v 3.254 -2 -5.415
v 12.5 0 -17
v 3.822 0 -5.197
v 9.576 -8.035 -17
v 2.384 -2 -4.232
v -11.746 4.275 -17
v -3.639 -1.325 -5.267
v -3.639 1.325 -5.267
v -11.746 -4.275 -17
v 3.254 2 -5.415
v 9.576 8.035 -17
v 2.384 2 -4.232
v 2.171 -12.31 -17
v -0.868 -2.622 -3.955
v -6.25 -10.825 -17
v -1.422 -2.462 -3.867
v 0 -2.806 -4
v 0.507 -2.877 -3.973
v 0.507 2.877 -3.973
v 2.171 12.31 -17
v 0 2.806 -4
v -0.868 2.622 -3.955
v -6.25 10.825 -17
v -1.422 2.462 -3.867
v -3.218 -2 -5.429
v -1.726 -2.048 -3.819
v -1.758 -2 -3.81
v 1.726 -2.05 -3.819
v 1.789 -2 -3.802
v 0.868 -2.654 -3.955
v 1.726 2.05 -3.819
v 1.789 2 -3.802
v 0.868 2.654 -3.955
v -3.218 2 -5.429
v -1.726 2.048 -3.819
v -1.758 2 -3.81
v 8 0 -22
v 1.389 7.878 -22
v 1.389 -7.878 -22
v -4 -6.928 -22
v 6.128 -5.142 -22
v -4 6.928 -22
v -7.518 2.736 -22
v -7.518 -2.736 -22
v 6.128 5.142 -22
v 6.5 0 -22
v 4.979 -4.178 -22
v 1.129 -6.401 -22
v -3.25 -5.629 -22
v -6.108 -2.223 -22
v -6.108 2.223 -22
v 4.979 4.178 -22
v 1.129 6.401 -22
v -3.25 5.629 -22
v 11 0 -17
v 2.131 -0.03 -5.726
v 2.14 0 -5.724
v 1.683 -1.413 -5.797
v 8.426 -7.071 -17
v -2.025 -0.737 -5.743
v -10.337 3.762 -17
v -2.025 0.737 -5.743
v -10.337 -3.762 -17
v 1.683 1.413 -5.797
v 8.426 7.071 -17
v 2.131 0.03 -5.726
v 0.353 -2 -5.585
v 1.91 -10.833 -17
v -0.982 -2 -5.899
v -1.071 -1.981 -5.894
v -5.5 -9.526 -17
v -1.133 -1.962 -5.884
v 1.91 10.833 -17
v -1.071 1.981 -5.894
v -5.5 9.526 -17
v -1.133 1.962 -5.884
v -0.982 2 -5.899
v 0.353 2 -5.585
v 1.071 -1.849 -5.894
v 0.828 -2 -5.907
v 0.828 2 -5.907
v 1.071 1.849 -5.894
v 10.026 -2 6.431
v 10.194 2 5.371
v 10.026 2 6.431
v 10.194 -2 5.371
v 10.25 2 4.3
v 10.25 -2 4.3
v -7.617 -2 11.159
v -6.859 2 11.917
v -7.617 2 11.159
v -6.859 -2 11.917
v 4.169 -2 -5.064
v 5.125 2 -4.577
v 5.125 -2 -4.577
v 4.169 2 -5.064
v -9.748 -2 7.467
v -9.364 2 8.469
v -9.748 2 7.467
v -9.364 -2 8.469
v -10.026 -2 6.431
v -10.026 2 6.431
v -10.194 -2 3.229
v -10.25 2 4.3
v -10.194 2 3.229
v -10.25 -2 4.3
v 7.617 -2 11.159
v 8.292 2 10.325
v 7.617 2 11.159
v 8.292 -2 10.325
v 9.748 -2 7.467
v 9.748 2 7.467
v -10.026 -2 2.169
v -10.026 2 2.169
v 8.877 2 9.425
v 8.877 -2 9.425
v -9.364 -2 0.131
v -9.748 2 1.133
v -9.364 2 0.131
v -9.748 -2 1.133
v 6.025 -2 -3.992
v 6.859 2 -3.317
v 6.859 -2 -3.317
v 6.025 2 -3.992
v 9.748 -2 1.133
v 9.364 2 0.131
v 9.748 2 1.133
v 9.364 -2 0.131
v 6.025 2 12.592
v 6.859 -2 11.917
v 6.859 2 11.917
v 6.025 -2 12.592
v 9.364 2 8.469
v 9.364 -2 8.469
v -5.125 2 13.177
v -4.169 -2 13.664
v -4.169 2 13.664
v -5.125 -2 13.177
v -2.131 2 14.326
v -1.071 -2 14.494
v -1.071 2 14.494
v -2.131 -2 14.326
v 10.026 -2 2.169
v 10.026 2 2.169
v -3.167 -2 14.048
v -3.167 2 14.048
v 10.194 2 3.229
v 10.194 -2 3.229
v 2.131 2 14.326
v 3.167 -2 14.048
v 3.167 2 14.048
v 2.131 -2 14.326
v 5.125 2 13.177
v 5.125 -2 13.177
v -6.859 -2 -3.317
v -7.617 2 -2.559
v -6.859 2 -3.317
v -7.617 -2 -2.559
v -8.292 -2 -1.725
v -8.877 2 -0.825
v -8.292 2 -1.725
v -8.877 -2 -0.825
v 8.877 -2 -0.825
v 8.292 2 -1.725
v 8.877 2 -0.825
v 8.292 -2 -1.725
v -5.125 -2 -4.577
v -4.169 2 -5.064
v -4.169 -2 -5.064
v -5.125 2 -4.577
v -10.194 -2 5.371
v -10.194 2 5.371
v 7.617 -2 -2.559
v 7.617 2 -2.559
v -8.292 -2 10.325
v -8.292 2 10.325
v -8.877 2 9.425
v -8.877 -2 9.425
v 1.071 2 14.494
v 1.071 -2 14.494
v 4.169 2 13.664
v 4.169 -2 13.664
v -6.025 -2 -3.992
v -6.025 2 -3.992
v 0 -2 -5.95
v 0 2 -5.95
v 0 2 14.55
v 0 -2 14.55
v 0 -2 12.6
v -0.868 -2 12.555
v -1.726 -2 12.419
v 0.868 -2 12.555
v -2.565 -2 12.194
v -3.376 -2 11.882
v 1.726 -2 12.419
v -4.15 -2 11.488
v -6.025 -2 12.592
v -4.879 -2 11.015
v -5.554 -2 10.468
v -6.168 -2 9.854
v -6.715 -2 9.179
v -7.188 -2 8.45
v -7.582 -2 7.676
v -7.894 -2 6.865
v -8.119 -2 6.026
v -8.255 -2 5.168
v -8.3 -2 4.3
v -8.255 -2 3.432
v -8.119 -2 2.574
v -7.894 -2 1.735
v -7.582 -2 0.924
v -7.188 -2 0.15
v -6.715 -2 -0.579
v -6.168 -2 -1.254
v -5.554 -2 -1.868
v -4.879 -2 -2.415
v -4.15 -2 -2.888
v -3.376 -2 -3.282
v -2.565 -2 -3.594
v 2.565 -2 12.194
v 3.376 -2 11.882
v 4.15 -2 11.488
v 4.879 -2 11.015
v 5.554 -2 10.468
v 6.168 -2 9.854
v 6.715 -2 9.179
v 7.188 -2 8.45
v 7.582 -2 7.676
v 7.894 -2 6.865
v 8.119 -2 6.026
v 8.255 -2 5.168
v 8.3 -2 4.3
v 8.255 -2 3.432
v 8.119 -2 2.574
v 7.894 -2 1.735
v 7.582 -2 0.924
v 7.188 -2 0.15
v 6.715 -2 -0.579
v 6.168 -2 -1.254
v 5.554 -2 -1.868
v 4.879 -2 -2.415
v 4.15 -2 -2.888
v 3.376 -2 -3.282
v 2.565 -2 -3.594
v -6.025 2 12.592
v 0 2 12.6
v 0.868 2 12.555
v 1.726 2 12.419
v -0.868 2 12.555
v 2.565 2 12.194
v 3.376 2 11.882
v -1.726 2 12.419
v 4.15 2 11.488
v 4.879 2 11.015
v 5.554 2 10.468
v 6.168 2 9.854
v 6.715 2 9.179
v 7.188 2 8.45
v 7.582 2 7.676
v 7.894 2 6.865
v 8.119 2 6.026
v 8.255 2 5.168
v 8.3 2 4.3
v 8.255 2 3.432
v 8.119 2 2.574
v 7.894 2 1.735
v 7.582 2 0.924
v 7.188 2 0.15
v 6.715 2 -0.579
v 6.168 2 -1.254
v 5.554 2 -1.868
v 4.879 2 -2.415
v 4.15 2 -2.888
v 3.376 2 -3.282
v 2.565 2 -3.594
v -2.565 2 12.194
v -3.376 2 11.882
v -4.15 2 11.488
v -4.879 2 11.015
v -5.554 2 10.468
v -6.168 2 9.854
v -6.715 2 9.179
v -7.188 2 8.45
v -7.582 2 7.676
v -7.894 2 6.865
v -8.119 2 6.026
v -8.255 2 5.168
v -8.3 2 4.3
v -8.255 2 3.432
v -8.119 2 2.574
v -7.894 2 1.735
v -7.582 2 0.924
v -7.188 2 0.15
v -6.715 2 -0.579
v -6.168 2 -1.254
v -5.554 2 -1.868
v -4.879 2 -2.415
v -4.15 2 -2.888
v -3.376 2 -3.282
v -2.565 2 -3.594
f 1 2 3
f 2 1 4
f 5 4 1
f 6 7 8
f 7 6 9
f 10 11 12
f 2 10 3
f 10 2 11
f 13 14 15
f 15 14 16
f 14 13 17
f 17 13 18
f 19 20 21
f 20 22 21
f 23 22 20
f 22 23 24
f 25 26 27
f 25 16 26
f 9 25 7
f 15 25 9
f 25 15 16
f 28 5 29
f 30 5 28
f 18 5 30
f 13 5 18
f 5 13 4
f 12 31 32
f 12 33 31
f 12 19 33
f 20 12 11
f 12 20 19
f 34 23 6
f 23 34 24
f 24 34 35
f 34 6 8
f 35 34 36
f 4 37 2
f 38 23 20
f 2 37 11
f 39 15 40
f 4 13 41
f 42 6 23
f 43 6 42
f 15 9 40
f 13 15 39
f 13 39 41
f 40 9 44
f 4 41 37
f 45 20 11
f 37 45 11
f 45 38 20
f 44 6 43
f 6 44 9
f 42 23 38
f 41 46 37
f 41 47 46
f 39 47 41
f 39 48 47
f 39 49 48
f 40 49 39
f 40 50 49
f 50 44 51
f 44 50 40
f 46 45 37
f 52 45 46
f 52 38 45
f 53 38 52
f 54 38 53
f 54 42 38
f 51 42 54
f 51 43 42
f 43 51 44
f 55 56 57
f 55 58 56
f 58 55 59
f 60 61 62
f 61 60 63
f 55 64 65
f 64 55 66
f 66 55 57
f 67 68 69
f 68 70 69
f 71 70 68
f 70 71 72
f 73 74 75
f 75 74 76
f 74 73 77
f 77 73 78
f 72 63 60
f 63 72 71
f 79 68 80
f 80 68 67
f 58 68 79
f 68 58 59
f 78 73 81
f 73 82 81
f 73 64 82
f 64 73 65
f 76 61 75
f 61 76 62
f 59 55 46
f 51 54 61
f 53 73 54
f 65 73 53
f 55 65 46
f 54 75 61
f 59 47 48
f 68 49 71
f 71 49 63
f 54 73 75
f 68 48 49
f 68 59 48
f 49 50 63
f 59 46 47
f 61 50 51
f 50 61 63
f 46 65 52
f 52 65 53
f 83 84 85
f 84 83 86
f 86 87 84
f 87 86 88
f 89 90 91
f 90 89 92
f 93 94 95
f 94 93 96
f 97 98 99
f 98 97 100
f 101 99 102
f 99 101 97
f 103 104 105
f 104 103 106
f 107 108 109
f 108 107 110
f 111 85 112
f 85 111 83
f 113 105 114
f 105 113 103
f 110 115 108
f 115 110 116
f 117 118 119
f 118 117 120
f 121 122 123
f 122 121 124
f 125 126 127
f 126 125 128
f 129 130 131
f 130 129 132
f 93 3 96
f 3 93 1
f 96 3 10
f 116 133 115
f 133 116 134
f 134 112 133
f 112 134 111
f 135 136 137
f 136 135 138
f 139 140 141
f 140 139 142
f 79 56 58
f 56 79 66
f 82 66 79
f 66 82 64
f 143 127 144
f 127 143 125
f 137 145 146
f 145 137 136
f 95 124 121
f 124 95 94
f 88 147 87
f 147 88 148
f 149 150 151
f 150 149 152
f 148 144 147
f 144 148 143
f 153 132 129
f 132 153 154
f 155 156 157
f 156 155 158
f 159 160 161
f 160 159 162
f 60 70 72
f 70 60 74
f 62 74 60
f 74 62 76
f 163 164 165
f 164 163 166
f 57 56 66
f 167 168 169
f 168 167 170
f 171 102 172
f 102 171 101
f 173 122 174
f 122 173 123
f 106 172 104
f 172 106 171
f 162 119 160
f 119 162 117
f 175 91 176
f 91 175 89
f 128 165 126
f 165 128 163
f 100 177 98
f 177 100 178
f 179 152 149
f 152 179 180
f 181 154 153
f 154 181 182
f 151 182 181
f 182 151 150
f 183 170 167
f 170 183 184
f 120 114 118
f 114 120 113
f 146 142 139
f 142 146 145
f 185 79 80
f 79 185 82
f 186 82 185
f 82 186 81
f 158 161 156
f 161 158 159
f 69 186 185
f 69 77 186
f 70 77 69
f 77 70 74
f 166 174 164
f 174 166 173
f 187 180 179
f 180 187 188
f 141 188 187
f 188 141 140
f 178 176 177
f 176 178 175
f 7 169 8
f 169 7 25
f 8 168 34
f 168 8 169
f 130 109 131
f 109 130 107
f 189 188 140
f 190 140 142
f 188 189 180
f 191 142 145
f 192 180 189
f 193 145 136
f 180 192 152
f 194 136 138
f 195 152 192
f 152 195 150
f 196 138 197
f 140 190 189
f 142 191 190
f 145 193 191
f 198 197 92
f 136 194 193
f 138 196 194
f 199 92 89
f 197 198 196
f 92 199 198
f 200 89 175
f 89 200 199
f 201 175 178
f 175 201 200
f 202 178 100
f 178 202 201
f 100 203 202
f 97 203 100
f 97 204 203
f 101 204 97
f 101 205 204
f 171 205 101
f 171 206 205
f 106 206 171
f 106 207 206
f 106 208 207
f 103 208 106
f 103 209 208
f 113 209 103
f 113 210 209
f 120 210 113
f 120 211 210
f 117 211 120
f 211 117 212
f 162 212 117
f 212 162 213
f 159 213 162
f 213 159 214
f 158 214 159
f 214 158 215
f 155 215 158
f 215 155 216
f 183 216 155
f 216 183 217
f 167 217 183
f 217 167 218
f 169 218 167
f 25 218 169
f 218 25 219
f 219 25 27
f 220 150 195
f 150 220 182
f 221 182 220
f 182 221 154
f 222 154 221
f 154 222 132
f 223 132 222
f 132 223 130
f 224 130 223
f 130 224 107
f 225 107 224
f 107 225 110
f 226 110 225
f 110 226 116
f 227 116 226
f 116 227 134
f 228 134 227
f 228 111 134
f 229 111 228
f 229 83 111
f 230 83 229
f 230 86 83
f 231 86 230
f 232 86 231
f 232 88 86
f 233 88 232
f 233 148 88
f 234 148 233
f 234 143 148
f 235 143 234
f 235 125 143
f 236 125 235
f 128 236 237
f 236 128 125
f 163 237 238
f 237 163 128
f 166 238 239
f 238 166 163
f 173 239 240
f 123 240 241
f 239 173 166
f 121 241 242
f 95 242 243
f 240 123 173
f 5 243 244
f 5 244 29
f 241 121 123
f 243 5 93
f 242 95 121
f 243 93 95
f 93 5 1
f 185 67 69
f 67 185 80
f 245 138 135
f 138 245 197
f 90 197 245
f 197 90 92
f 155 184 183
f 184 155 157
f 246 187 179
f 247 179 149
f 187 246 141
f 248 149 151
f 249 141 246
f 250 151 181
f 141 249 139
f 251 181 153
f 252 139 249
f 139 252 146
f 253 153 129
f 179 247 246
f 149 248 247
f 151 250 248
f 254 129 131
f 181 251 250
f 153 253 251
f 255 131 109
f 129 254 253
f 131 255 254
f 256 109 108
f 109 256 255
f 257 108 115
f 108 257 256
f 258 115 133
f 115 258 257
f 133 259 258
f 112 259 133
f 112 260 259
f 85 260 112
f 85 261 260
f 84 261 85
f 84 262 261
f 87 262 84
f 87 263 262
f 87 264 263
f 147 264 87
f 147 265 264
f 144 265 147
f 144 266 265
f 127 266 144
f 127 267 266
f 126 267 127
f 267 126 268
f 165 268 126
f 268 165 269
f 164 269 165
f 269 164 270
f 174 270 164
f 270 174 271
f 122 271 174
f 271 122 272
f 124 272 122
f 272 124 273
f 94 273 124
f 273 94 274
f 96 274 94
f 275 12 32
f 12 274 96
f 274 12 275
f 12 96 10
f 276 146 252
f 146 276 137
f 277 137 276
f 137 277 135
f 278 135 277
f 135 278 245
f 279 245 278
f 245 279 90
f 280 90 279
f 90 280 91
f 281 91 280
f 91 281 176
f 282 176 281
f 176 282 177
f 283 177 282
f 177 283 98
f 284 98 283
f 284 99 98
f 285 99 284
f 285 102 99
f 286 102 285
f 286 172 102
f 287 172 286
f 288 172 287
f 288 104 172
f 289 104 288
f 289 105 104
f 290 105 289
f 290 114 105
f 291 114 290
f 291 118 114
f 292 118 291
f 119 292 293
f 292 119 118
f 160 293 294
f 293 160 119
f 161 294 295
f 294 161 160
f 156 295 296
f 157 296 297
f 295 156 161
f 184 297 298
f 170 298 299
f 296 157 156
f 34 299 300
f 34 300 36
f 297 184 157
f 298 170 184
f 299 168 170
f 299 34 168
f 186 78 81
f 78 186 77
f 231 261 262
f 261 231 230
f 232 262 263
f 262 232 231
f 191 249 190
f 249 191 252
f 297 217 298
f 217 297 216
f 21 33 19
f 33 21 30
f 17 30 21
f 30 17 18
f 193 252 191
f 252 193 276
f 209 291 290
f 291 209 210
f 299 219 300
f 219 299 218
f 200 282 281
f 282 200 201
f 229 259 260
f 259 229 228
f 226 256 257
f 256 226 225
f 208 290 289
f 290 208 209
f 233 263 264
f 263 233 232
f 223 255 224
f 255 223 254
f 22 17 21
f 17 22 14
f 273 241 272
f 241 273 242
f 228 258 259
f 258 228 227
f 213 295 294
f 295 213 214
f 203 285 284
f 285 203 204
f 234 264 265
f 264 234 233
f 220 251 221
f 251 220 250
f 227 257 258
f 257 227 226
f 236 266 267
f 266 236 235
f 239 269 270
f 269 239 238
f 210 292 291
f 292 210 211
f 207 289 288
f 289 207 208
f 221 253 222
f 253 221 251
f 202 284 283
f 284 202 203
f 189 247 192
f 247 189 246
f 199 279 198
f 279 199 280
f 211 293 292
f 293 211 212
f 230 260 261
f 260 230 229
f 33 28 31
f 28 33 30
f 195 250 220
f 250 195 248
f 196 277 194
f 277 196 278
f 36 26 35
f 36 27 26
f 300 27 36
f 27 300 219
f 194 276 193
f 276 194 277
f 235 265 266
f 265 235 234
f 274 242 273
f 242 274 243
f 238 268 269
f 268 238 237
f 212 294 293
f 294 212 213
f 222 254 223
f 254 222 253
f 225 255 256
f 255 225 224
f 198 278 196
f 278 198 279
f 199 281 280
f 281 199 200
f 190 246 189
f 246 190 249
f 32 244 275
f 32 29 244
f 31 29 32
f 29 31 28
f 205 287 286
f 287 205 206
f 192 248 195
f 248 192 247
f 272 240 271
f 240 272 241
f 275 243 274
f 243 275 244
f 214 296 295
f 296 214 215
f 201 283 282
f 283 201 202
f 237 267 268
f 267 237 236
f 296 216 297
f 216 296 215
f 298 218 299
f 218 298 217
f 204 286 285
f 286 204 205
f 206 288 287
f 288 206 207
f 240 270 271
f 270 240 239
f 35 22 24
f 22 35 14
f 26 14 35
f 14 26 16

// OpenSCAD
// Internal diameter of ring (in mm).
internal_diameter = 16.6;
$fn=60 * 1;


module diamond(w, w2, h1, h2) {
    $fn=9;
    cylinder(d1=0, d2=w, h=h1);
    translate([0, 0, h1]) cylinder(d1=w, d2=w2, h=h2);
}

module dvase(w, w2, h1, h2) {
    difference() {
            diamond(w, w2, h1, h2);
            translate([0, 0, 3]) diamond(w-3, w2-3, h1-3, h2);
            translate([0, 0, h1-.1]) cylinder(d=w2-4, h=h2+1);
    }
}

module ring(id) {
    off = (id / 2) - 4;
    difference() {
        union() {
            rotate([180, 0, 0]) dvase(25, 16, 17, 5);
            translate([0, 0, off]) rotate([90, 0, 0])cylinder(d=id+3.9, h=4, center=true);
        }
        translate([0, 0, off]) rotate([90, 0, 0]) cylinder(d=id, h=25, center=true);
    }
}

ring(internal_diameter);
